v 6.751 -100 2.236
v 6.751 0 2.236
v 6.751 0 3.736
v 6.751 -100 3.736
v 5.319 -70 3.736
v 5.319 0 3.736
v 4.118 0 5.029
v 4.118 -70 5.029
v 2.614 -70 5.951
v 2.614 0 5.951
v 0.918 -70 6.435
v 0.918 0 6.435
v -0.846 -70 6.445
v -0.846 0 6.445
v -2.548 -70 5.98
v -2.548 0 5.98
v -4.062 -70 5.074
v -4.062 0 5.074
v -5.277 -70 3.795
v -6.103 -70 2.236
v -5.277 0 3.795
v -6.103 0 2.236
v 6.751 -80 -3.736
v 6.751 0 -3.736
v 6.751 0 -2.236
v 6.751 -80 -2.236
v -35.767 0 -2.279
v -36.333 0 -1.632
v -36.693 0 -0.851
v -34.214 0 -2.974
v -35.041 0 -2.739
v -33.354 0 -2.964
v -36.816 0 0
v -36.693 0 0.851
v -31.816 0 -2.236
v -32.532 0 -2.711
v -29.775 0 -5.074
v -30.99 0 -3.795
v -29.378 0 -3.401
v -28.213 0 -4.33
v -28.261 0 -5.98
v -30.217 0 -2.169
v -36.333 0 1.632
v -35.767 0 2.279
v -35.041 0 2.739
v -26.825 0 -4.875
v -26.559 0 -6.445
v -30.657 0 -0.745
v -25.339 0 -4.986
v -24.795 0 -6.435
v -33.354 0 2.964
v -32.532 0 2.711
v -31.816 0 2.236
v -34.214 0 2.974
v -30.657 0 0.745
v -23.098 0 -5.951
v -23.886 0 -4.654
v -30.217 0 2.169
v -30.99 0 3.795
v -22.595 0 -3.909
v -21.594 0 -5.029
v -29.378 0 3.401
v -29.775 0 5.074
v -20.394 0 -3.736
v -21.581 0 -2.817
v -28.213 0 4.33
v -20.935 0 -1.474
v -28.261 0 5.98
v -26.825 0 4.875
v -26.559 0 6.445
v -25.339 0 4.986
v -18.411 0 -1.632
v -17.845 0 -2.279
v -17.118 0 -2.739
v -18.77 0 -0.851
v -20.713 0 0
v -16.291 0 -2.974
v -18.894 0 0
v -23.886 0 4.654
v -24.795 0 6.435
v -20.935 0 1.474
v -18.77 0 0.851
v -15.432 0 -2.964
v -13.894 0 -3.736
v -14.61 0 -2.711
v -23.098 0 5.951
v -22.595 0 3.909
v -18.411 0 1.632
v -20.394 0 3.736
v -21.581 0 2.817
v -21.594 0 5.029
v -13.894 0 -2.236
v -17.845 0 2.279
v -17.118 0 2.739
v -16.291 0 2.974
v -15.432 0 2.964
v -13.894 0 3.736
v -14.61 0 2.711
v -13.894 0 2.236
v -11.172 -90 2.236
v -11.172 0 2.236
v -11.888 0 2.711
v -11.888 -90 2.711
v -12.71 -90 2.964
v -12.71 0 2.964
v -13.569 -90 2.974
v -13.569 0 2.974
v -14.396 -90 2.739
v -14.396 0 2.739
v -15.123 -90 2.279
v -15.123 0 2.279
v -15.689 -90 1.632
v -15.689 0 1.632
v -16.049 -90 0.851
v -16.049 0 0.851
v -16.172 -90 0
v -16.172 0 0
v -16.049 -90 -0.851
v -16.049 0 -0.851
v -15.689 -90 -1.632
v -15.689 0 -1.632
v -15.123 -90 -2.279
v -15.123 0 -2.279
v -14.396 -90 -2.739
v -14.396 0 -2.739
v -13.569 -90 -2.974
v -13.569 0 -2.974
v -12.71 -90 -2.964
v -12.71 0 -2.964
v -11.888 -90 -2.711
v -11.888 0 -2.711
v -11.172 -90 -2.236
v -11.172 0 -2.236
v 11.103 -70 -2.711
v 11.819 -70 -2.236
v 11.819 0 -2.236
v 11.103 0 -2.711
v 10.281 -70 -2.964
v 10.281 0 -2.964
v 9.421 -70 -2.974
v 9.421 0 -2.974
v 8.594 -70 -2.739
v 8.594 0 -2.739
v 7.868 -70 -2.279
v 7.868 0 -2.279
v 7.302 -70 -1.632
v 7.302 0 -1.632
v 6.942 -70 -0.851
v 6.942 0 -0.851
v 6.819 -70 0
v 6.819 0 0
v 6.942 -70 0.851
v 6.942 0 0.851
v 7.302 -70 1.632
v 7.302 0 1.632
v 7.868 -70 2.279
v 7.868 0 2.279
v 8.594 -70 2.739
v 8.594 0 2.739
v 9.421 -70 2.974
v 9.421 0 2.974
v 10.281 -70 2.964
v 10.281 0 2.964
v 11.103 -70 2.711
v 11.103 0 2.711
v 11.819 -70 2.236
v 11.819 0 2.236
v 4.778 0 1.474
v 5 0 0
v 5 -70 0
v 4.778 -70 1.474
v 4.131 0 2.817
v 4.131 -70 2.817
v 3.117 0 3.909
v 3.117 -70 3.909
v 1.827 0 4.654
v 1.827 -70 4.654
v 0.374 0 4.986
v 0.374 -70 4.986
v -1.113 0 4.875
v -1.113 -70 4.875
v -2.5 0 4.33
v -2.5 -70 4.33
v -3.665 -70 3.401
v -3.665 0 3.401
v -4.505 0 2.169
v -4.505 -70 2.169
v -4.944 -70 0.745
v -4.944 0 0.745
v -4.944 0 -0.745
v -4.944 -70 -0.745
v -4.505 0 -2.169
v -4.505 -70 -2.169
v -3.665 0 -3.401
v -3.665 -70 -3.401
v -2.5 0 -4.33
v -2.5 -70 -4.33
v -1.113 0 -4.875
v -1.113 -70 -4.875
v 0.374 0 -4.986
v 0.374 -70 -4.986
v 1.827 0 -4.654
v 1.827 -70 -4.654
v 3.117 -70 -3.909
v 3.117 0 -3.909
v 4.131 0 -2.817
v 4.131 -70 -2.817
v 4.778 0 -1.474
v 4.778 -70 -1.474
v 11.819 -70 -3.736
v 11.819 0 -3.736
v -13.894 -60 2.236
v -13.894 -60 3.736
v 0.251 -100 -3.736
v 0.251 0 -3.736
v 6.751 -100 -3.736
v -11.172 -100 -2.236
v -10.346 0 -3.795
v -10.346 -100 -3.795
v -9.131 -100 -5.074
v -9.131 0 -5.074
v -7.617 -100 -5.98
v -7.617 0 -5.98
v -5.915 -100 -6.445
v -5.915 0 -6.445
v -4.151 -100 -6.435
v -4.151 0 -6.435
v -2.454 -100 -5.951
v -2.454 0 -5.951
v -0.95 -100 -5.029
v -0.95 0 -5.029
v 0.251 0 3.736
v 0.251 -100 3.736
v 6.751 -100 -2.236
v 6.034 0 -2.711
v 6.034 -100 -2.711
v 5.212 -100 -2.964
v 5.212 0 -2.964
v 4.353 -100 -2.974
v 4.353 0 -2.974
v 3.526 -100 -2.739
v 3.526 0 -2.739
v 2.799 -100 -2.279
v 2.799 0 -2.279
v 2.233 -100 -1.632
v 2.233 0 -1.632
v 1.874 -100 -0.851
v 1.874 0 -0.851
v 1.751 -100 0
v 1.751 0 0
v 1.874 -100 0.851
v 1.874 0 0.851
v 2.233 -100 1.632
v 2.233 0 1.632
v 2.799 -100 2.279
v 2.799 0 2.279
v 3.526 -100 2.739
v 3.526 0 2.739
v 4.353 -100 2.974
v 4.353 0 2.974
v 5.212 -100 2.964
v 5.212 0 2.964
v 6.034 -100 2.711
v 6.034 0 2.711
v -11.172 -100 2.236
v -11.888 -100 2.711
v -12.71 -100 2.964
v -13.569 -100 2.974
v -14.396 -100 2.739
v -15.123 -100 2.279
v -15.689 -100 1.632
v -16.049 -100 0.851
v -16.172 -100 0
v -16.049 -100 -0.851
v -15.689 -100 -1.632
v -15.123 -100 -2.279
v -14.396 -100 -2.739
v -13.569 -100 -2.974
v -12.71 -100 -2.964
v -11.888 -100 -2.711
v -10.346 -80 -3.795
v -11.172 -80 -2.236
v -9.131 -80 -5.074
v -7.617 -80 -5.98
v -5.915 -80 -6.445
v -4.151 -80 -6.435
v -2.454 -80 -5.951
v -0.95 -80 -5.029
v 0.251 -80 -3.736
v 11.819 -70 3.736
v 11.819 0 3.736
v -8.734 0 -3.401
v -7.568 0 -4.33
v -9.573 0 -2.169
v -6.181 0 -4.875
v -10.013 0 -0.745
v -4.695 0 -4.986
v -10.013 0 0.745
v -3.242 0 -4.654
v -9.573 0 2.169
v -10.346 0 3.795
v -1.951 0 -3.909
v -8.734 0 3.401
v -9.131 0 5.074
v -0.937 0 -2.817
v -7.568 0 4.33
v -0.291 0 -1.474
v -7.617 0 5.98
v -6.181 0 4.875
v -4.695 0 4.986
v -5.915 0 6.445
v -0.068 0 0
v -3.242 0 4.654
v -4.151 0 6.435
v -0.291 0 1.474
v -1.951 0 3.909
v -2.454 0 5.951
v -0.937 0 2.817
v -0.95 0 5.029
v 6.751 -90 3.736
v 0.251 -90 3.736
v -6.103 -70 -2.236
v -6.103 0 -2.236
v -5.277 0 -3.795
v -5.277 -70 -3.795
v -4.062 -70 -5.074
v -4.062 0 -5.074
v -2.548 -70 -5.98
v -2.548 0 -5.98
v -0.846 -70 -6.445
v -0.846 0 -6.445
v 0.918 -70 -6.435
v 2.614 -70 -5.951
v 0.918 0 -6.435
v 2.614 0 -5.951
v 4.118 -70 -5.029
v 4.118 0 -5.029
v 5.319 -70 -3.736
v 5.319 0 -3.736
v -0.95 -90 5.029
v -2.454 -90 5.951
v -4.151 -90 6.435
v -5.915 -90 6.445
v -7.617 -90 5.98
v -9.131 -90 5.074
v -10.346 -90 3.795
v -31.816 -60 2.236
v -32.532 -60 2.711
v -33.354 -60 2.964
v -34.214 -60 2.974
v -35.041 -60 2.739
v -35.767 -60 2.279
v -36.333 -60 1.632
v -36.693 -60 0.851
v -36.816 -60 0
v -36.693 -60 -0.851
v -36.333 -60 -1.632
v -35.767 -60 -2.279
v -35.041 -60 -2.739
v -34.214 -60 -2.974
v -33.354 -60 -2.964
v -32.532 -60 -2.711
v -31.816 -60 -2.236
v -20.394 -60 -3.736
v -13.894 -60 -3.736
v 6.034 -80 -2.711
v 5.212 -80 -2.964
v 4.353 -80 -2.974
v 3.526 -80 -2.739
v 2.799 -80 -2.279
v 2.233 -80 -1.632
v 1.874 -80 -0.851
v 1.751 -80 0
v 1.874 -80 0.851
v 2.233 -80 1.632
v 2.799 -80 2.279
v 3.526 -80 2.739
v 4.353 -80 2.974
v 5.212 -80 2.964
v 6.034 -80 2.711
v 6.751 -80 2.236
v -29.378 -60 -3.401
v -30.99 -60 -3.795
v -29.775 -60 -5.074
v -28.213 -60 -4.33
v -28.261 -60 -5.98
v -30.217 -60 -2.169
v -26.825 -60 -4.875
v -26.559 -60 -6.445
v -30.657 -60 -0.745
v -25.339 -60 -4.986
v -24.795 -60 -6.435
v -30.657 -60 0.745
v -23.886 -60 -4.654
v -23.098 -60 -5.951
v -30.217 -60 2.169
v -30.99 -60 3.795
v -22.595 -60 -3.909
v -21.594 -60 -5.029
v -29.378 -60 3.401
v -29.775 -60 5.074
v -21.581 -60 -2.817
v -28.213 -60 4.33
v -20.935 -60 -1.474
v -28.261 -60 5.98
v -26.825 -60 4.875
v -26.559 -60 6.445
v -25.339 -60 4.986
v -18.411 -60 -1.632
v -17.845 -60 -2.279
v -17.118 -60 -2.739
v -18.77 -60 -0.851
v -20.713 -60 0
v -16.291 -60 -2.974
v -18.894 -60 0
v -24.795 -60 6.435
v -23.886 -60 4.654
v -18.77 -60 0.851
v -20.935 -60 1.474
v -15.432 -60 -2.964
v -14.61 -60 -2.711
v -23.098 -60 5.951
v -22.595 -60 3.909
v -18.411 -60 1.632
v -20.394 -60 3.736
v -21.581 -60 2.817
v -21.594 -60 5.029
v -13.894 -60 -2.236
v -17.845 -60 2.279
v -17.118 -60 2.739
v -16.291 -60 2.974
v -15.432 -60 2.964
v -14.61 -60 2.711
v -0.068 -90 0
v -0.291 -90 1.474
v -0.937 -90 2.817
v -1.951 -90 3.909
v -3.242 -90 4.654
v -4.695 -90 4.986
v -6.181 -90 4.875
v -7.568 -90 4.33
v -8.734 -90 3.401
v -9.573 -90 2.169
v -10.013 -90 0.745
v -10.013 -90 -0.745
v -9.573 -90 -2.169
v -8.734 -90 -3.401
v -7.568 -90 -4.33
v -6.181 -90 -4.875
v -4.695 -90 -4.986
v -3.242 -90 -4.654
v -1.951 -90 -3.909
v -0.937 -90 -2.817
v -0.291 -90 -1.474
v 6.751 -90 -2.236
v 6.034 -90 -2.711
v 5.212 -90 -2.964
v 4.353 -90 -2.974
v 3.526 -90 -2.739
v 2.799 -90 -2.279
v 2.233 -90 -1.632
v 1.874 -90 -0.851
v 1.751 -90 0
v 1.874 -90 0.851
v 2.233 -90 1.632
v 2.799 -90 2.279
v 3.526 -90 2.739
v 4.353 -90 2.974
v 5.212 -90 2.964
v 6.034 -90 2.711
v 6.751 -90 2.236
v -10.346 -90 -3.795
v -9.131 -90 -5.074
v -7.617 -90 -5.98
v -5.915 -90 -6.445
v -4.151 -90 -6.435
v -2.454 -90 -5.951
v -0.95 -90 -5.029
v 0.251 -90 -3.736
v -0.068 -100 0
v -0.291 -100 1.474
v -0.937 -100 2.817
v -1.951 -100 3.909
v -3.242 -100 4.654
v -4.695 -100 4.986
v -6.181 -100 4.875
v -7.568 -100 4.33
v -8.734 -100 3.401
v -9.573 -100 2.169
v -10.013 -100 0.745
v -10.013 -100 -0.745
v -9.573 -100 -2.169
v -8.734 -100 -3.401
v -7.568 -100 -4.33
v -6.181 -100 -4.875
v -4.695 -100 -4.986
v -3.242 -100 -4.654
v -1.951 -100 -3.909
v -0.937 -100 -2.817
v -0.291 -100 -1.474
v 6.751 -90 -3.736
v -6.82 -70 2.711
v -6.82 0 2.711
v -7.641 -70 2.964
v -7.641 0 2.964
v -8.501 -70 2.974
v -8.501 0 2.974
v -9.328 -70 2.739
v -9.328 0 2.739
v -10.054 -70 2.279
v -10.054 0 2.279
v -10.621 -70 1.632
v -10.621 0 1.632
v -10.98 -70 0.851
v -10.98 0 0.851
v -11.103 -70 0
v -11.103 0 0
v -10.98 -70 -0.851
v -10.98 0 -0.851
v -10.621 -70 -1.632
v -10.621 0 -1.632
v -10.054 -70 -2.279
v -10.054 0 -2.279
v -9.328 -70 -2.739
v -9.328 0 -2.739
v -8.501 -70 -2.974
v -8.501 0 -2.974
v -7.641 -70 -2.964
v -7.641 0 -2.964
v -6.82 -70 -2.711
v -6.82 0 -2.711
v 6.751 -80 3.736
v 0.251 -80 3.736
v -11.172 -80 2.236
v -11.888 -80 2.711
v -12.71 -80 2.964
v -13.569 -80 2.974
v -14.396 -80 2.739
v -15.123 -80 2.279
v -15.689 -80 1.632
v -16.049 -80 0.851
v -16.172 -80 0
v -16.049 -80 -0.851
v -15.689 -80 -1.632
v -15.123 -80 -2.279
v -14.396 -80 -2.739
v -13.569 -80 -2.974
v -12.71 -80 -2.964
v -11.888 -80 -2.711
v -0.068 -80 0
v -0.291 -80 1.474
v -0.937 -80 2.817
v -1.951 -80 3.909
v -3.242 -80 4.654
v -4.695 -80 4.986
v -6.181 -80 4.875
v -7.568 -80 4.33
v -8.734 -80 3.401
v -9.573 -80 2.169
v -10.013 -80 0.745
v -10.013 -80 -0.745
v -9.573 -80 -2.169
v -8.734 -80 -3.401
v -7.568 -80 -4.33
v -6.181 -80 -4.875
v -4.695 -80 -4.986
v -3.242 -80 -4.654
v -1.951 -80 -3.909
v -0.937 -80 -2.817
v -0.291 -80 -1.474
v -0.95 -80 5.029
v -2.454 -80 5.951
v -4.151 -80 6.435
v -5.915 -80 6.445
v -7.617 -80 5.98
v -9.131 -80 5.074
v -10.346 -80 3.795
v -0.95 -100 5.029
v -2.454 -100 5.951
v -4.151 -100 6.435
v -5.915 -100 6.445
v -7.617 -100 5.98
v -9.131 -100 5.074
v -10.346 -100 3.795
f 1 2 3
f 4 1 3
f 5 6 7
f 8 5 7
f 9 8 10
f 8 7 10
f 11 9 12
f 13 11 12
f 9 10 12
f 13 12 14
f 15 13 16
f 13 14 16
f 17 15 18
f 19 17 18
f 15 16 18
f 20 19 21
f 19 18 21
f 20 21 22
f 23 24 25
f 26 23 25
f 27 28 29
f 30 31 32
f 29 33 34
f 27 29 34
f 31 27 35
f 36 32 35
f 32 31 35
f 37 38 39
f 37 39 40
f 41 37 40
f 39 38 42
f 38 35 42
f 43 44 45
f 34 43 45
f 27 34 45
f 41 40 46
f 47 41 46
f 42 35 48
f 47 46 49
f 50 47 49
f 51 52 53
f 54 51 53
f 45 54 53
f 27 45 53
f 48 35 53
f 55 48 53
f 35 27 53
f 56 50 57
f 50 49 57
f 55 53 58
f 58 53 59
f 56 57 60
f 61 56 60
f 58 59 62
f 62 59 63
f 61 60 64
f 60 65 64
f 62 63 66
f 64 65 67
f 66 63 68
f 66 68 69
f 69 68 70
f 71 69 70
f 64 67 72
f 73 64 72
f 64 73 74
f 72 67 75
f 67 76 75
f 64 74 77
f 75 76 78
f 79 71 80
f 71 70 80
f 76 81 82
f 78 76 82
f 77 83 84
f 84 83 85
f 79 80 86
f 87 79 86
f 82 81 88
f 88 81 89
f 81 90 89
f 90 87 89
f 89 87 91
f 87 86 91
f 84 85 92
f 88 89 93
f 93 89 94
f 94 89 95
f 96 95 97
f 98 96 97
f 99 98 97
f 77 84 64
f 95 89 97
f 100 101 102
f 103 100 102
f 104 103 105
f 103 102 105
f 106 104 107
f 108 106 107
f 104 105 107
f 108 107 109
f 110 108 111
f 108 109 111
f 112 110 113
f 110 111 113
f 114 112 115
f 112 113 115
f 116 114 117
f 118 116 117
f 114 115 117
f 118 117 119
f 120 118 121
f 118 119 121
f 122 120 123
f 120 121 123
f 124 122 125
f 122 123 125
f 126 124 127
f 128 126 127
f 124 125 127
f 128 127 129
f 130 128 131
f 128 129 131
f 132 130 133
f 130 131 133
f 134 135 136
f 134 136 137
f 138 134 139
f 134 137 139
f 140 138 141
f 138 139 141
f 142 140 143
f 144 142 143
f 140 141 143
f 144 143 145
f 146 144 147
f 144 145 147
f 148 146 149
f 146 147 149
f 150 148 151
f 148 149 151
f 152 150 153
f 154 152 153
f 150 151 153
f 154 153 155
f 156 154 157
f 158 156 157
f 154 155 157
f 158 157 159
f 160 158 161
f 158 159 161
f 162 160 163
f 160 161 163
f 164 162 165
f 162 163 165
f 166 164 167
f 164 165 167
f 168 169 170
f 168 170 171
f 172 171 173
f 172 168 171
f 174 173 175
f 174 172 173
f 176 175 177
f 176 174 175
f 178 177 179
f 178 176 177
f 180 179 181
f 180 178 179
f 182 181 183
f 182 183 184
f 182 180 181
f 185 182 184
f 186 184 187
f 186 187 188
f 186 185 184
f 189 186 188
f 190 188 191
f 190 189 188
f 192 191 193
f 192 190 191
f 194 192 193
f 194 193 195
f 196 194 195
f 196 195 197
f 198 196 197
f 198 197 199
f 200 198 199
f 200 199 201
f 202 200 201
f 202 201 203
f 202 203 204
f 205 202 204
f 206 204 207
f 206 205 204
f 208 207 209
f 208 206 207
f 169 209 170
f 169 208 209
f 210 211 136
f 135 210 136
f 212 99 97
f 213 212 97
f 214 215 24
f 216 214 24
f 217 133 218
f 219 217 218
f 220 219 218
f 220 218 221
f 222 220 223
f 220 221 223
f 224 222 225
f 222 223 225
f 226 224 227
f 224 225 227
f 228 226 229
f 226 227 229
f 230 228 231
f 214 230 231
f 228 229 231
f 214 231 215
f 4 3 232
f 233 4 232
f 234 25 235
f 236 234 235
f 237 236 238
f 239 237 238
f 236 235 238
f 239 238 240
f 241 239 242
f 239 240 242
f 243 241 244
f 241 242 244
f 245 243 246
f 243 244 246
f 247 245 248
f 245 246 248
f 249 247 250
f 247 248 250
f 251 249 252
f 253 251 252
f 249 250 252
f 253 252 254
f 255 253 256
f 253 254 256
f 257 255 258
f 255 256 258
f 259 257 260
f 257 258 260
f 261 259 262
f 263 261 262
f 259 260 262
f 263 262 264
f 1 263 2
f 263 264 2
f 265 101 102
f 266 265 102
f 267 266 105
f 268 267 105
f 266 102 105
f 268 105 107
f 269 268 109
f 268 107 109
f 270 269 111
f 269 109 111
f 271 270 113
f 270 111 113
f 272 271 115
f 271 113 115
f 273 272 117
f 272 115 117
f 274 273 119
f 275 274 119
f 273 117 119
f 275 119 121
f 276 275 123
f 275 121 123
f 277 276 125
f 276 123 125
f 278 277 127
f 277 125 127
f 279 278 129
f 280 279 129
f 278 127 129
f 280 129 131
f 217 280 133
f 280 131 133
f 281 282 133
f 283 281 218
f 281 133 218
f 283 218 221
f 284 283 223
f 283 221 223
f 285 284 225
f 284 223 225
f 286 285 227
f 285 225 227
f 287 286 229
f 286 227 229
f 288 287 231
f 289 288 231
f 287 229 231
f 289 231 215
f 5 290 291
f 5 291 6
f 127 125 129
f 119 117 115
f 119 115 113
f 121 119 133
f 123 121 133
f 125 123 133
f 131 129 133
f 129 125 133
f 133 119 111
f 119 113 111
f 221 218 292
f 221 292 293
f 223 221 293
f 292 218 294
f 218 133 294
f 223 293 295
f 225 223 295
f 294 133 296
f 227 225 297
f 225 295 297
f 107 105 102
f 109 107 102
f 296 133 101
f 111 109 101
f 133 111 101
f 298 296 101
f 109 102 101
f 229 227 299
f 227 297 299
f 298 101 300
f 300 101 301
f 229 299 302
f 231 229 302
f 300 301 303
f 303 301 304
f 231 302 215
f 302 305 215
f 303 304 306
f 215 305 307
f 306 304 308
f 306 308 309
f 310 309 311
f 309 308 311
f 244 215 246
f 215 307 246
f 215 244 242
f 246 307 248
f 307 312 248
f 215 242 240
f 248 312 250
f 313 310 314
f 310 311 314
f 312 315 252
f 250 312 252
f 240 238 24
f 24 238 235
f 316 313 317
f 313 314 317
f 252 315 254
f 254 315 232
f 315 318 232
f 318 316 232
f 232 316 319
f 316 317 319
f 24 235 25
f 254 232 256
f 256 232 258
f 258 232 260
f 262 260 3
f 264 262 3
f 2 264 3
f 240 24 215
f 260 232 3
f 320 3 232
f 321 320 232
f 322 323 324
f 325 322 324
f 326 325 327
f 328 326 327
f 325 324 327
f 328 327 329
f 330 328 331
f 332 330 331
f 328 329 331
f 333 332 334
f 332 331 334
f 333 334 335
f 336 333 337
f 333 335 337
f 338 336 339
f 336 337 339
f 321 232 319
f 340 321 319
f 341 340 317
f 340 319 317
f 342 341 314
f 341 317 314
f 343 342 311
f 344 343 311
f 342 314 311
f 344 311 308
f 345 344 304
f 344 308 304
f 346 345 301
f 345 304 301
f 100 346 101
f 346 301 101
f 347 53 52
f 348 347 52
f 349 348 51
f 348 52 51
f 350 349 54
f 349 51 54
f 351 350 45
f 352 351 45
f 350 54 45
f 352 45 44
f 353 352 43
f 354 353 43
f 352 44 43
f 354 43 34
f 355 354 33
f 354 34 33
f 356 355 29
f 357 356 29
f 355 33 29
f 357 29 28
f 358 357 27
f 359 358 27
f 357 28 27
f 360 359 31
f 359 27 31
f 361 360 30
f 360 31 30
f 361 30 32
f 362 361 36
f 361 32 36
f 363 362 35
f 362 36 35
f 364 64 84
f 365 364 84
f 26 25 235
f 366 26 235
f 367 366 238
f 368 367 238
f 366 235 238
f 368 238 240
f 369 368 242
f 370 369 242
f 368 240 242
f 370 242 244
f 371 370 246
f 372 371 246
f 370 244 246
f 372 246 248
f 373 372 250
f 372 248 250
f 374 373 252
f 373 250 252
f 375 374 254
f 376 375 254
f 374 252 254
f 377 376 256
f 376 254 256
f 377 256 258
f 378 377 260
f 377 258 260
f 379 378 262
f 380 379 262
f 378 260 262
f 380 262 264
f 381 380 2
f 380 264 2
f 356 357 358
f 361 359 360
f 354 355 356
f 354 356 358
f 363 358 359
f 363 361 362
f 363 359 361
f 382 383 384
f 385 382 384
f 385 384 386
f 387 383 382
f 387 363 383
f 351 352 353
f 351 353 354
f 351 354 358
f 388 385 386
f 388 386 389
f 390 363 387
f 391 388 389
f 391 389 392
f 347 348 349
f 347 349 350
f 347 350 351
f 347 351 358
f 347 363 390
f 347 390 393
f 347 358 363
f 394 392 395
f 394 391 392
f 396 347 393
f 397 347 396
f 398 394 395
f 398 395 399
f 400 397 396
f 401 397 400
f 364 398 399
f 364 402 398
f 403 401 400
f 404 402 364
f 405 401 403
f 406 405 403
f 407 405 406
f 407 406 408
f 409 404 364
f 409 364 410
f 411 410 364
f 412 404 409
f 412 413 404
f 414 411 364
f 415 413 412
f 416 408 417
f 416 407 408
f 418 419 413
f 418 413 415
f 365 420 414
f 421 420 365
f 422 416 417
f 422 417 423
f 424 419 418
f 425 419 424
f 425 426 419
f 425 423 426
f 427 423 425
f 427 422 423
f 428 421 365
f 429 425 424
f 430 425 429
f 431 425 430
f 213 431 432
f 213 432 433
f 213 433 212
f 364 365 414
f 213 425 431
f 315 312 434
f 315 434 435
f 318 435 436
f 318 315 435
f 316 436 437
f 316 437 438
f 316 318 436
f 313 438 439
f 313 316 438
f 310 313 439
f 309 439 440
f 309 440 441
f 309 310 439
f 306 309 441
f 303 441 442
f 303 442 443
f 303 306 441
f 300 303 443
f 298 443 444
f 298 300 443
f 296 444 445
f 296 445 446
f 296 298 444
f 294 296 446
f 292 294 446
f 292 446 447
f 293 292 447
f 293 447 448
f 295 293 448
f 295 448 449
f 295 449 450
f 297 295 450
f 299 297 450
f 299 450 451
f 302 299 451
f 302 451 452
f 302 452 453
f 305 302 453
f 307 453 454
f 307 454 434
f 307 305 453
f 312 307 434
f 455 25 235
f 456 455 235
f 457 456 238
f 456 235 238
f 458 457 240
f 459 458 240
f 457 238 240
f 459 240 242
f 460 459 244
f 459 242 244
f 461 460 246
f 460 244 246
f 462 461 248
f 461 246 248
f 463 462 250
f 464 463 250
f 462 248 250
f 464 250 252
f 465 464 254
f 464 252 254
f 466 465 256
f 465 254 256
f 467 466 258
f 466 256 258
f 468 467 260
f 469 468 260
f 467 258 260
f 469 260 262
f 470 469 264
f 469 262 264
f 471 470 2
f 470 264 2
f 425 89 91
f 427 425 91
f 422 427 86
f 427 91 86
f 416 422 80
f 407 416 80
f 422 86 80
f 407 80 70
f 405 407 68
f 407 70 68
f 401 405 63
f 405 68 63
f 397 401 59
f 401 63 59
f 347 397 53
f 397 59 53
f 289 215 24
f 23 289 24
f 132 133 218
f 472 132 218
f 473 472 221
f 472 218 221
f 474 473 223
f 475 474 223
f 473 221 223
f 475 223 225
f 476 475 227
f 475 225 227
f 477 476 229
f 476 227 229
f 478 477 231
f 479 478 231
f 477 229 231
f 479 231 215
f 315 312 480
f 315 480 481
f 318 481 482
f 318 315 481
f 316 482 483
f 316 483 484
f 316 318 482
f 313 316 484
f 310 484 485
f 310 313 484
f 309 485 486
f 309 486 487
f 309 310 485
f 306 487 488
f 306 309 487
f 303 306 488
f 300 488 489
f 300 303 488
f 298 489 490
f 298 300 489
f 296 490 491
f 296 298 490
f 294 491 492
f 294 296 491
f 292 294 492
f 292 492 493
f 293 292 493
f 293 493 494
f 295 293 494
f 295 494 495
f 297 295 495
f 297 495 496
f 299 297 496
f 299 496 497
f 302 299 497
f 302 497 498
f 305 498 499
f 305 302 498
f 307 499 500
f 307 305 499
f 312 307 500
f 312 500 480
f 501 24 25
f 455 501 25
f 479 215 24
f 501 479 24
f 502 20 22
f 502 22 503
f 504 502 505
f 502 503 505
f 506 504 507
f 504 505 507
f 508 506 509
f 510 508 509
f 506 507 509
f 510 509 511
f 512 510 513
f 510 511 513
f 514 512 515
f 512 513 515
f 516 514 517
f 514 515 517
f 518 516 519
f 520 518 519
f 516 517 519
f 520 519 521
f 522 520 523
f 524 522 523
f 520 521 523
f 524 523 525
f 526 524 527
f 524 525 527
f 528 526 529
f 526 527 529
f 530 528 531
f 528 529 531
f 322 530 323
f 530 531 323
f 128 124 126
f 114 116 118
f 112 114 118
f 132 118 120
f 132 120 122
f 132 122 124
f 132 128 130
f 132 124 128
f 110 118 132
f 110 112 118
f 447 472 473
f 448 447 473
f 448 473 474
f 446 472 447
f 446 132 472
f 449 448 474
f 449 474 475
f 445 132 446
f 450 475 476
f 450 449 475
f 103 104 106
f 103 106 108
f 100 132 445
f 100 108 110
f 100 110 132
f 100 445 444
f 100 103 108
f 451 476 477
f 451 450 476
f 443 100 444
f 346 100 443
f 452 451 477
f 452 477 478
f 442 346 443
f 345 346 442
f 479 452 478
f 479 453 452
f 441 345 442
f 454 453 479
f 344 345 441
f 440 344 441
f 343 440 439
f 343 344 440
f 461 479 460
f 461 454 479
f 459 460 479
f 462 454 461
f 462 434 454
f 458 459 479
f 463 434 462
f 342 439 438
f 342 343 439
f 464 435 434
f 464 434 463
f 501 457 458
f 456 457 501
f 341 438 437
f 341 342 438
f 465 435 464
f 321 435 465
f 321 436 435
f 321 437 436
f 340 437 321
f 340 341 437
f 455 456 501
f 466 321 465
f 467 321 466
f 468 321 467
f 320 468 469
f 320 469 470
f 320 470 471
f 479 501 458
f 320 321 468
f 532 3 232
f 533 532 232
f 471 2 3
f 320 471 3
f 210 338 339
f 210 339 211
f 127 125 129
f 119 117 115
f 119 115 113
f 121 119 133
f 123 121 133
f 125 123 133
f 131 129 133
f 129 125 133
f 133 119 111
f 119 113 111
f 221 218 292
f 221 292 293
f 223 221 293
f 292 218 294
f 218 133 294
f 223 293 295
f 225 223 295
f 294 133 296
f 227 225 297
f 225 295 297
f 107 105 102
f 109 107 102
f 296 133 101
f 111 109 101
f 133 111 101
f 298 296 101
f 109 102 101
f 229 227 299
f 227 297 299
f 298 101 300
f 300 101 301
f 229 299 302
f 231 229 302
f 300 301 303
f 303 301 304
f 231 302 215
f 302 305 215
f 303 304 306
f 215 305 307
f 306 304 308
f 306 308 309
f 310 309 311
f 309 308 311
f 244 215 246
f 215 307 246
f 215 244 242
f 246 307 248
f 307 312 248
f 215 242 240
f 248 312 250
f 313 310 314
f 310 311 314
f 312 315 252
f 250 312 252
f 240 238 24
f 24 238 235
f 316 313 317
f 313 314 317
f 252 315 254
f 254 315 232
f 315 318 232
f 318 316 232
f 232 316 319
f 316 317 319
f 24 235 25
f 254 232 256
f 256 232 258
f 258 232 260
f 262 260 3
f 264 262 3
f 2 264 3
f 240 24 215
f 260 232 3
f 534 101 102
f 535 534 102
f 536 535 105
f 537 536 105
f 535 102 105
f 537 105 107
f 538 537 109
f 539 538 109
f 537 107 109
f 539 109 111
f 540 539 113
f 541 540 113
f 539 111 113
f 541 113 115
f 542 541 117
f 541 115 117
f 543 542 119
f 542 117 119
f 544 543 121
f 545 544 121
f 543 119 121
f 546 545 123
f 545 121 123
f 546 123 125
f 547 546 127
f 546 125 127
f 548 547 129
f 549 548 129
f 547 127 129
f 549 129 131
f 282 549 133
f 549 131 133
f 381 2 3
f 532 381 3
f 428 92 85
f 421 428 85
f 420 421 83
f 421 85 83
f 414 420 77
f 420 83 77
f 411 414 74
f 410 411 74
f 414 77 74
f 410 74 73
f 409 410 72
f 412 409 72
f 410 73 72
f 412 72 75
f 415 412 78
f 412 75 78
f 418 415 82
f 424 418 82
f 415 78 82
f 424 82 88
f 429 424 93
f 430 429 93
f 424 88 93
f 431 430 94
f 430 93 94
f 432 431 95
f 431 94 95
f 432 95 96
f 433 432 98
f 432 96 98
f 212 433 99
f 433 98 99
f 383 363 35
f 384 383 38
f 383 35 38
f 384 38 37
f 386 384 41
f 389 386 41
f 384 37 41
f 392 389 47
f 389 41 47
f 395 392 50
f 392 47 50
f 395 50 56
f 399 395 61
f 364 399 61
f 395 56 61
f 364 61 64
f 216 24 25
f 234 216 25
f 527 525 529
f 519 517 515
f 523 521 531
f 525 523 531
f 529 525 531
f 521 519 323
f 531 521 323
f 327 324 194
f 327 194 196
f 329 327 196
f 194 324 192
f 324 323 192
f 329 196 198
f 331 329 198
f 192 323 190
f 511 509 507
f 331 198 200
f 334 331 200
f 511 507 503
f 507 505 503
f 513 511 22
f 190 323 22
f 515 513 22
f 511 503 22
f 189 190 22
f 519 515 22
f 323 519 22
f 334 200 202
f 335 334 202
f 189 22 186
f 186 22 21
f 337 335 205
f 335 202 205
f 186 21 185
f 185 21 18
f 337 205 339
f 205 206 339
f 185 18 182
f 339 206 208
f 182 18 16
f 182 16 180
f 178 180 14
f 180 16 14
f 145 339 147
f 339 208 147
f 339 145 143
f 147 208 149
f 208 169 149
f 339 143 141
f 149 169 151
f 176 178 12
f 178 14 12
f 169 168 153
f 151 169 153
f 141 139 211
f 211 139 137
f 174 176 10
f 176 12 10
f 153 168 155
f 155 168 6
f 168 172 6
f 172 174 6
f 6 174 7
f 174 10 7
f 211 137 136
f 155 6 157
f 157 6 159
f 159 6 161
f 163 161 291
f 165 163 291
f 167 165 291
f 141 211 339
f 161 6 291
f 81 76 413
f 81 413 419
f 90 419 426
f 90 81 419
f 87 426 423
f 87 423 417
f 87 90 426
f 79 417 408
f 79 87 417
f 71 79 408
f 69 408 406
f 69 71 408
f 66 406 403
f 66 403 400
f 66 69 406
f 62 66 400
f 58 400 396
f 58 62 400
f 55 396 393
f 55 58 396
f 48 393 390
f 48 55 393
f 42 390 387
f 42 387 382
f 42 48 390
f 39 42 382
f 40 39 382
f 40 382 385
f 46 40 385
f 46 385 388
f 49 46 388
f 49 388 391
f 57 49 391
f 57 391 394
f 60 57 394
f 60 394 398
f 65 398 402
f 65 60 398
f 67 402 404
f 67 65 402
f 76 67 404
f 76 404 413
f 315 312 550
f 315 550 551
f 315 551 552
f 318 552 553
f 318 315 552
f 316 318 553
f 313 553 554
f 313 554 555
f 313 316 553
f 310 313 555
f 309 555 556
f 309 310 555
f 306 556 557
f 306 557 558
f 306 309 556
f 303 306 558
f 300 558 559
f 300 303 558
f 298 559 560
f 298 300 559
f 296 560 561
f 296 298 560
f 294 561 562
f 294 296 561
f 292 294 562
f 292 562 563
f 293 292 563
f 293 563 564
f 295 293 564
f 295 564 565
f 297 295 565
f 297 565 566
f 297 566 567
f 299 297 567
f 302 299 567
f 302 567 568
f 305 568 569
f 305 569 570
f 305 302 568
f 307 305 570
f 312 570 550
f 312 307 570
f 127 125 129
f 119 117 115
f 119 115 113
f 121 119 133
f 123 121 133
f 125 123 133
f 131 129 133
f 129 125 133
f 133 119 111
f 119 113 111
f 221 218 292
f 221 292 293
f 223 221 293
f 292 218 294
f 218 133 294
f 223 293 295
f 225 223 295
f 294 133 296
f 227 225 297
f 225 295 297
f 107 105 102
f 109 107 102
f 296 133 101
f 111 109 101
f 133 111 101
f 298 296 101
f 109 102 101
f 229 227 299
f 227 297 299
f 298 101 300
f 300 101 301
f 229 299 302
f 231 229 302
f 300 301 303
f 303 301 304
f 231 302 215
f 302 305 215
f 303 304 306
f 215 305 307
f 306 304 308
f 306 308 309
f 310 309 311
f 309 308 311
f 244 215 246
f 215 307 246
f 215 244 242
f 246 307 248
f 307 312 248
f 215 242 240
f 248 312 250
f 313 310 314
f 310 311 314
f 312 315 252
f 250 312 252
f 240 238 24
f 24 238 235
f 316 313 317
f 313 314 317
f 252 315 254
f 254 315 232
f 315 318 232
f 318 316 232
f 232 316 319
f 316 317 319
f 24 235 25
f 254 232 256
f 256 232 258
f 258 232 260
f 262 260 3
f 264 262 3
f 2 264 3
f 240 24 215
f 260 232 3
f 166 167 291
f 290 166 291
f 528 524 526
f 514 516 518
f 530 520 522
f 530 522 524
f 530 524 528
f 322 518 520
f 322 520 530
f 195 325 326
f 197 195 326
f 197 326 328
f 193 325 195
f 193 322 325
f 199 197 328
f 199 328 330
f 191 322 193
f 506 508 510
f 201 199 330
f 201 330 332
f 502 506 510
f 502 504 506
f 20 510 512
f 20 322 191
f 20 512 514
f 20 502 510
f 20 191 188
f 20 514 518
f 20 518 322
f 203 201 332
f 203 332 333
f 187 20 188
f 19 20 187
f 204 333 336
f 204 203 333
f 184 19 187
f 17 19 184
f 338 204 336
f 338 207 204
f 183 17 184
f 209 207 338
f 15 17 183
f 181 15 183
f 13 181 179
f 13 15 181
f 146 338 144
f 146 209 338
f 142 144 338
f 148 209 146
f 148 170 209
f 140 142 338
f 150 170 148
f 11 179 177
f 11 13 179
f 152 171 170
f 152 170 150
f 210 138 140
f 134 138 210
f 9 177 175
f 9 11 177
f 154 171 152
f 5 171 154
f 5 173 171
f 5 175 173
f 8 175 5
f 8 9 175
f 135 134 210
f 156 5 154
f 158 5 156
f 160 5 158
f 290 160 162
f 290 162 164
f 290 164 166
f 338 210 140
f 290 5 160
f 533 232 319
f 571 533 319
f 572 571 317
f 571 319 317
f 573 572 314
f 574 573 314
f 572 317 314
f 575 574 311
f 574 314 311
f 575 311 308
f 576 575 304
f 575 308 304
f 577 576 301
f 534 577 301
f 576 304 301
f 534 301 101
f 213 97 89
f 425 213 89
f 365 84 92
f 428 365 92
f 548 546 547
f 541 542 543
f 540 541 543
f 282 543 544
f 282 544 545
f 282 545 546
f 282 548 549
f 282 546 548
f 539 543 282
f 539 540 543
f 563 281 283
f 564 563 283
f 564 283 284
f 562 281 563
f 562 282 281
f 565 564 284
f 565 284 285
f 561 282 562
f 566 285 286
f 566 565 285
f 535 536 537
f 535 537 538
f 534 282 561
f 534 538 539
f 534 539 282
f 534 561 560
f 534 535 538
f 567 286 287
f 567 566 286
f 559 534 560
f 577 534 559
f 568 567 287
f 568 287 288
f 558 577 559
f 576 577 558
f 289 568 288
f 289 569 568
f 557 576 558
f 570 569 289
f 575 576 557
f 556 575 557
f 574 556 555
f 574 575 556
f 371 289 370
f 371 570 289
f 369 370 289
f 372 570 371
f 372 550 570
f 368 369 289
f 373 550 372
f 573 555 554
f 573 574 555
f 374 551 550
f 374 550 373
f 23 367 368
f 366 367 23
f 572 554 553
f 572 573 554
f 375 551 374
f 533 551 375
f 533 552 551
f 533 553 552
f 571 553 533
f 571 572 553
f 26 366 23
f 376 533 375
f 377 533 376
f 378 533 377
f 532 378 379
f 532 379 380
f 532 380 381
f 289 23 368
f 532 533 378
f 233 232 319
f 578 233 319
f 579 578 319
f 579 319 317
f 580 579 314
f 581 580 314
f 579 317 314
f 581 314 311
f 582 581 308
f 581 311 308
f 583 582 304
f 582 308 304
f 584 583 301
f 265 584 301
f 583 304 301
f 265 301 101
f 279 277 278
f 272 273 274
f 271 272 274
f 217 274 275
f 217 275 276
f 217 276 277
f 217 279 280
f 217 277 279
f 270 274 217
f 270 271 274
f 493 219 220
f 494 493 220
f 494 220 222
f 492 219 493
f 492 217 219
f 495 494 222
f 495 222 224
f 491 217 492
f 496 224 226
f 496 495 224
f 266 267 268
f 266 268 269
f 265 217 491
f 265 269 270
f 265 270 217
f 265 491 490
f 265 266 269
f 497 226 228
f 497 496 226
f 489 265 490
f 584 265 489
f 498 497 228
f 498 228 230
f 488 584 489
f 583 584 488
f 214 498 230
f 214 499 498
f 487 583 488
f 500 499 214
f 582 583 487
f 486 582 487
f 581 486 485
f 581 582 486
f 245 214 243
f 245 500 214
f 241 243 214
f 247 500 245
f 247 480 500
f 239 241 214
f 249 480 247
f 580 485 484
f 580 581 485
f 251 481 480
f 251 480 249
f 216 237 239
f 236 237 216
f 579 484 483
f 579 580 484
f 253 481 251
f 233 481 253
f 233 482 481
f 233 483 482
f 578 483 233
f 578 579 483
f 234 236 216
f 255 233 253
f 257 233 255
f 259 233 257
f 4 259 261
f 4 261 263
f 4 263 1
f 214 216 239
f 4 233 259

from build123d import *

# Parameters (mm, degrees)
F0_R     = 5
F1_DEPTH = 70
F2_R     = 5
F3_DEPTH = 60
F4_R     = 5
F5_DEPTH = 80
F6_R     = 5
F7_DEPTH = 90
F8_R     = 5
F9_DEPTH = 100


with BuildPart() as f1:
    # F0 (on Front) → F1 (new body)
    with BuildSketch(Plane.XZ):
        with BuildLine():
            ThreePointArc((5.3190032964, -3.7360679775), (6.1977222198, -1.9591424876), (6.5, 0))
            ThreePointArc((6.5, 0), (6.1977222198, 1.9591424876), (5.3190032964, 3.7360679775))
            ThreePointArc((5.3190032964, 3.7360679775), (-0.8463283212, 6.4446666611), (-6.1032778079, 2.2360679775))
            ThreePointArc((-6.1032778079, 2.2360679775), (-6.5, 0), (-6.1032778079, -2.2360679775))
            ThreePointArc((-6.1032778079, -2.2360679775), (-0.8463283212, -6.4446666611), (5.3190032964, -3.7360679775))
        make_face()
        Circle(F0_R, mode=Mode.SUBTRACT)
        with BuildLine():
            ThreePointArc((-6.1032778079, -2.2360679775), (-6.5, 0), (-6.1032778079, 2.2360679775))
            ThreePointArc((-6.1032778079, 2.2360679775), (-11.1032778079, 0), (-6.1032778079, -2.2360679775))
        make_face()
        with BuildLine():
            ThreePointArc((5.3190032964, 3.7360679775), (6.1977222198, 1.9591424876), (6.5, 0))
            ThreePointArc((6.5, 0), (6.1977222198, -1.9591424876), (5.3190032964, -3.7360679775))
            Line((5.3190032964, -3.7360679775), (11.8190032964, -3.7360679775))
            Line((11.8190032964, -3.7360679775), (11.8190032964, -2.2360679775))
            ThreePointArc((11.8190032964, -2.2360679775), (6.8190032964, 0), (11.8190032964, 2.2360679775))
            Line((11.8190032964, 2.2360679775), (11.8190032964, 3.7360679775))
            Line((11.8190032964, 3.7360679775), (5.3190032964, 3.7360679775))
        make_face()
    extrude(amount=F1_DEPTH)


with BuildPart() as f3:
    # F2 (on Front) → F3 (new body)
    with BuildSketch(Plane.XZ):
        with BuildLine():
            ThreePointArc((-31.8158183519, -2.2360679775), (-32.212540544, 0), (-31.8158183519, 2.2360679775))
            ThreePointArc((-31.8158183519, 2.2360679775), (-36.8158183519, 0), (-31.8158183519, -2.2360679775))
        make_face()
        with BuildLine():
            ThreePointArc((-20.3935372476, -3.7360679775), (-19.5148183243, -1.9591424876), (-19.212540544, 0))
            ThreePointArc((-19.212540544, 0), (-19.5148183243, 1.9591424876), (-20.3935372476, 3.7360679775))
            ThreePointArc((-20.3935372476, 3.7360679775), (-26.5588688653, 6.4446666611), (-31.8158183519, 2.2360679775))
            ThreePointArc((-31.8158183519, 2.2360679775), (-32.212540544, 0), (-31.8158183519, -2.2360679775))
            ThreePointArc((-31.8158183519, -2.2360679775), (-26.5588688653, -6.4446666611), (-20.3935372476, -3.7360679775))
        make_face()
        with Locations((-25.712540544, 0)):
            Circle(F2_R, mode=Mode.SUBTRACT)
        with BuildLine():
            ThreePointArc((-20.3935372476, 3.7360679775), (-19.5148183243, 1.9591424876), (-19.212540544, 0))
            ThreePointArc((-19.212540544, 0), (-19.5148183243, -1.9591424876), (-20.3935372476, -3.7360679775))
            Line((-20.3935372476, -3.7360679775), (-13.8935372476, -3.7360679775))
            Line((-13.8935372476, -3.7360679775), (-13.8935372476, -2.2360679775))
            ThreePointArc((-13.8935372476, -2.2360679775), (-18.8935372476, 0), (-13.8935372476, 2.2360679775))
            Line((-13.8935372476, 2.2360679775), (-13.8935372476, 3.7360679775))
            Line((-13.8935372476, 3.7360679775), (-20.3935372476, 3.7360679775))
        make_face()
    extrude(amount=F3_DEPTH)


with BuildPart() as f5:
    # F4 (on Front) → F5 (new body)
    with BuildSketch(Plane.XZ):
        with BuildLine():
            ThreePointArc((-11.171749634, -2.2360679775), (-11.5684718261, 0), (-11.171749634, 2.2360679775))
            ThreePointArc((-11.171749634, 2.2360679775), (-16.171749634, 0), (-11.171749634, -2.2360679775))
        make_face()
        with BuildLine():
            ThreePointArc((0.2505314703, -3.7360679775), (1.1292503937, -1.9591424876), (1.4315281739, 0))
            ThreePointArc((1.4315281739, 0), (1.1292503937, 1.9591424876), (0.2505314703, 3.7360679775))
            ThreePointArc((0.2505314703, 3.7360679775), (-5.9148001473, 6.4446666611), (-11.171749634, 2.2360679775))
            ThreePointArc((-11.171749634, 2.2360679775), (-11.5684718261, 0), (-11.171749634, -2.2360679775))
            ThreePointArc((-11.171749634, -2.2360679775), (-5.9148001473, -6.4446666611), (0.2505314703, -3.7360679775))
        make_face()
        with Locations((-5.0684718261, 0)):
            Circle(F4_R, mode=Mode.SUBTRACT)
        with BuildLine():
            ThreePointArc((0.2505314703, 3.7360679775), (1.1292503937, 1.9591424876), (1.4315281739, 0))
            ThreePointArc((1.4315281739, 0), (1.1292503937, -1.9591424876), (0.2505314703, -3.7360679775))
            Line((0.2505314703, -3.7360679775), (6.7505314703, -3.7360679775))
            Line((6.7505314703, -3.7360679775), (6.7505314703, -2.2360679775))
            ThreePointArc((6.7505314703, -2.2360679775), (1.7505314703, 0), (6.7505314703, 2.2360679775))
            Line((6.7505314703, 2.2360679775), (6.7505314703, 3.7360679775))
            Line((6.7505314703, 3.7360679775), (0.2505314703, 3.7360679775))
        make_face()
    extrude(amount=F5_DEPTH)


with BuildPart() as f7:
    # F6 (on Front) → F7 (new body)
    with BuildSketch(Plane.XZ):
        with BuildLine():
            ThreePointArc((-11.171749634, -2.2360679775), (-11.5684718261, 0), (-11.171749634, 2.2360679775))
            ThreePointArc((-11.171749634, 2.2360679775), (-16.171749634, 0), (-11.171749634, -2.2360679775))
        make_face()
        with BuildLine():
            ThreePointArc((0.2505314703, -3.7360679775), (1.1292503937, -1.9591424876), (1.4315281739, 0))
            ThreePointArc((1.4315281739, 0), (1.1292503937, 1.9591424876), (0.2505314703, 3.7360679775))
            ThreePointArc((0.2505314703, 3.7360679775), (-5.9148001473, 6.4446666611), (-11.171749634, 2.2360679775))
            ThreePointArc((-11.171749634, 2.2360679775), (-11.5684718261, 0), (-11.171749634, -2.2360679775))
            ThreePointArc((-11.171749634, -2.2360679775), (-5.9148001473, -6.4446666611), (0.2505314703, -3.7360679775))
        make_face()
        with Locations((-5.0684718261, 0)):
            Circle(F6_R, mode=Mode.SUBTRACT)
        with BuildLine():
            ThreePointArc((0.2505314703, 3.7360679775), (1.1292503937, 1.9591424876), (1.4315281739, 0))
            ThreePointArc((1.4315281739, 0), (1.1292503937, -1.9591424876), (0.2505314703, -3.7360679775))
            Line((0.2505314703, -3.7360679775), (6.7505314703, -3.7360679775))
            Line((6.7505314703, -3.7360679775), (6.7505314703, -2.2360679775))
            ThreePointArc((6.7505314703, -2.2360679775), (1.7505314703, 0), (6.7505314703, 2.2360679775))
            Line((6.7505314703, 2.2360679775), (6.7505314703, 3.7360679775))
            Line((6.7505314703, 3.7360679775), (0.2505314703, 3.7360679775))
        make_face()
    extrude(amount=F7_DEPTH)


with BuildPart() as f9:
    # F8 (on Front) → F9 (new body)
    with BuildSketch(Plane.XZ):
        with BuildLine():
            ThreePointArc((-11.171749634, -2.2360679775), (-11.5684718261, 0), (-11.171749634, 2.2360679775))
            ThreePointArc((-11.171749634, 2.2360679775), (-16.171749634, 0), (-11.171749634, -2.2360679775))
        make_face()
        with BuildLine():
            ThreePointArc((0.2505314703, -3.7360679775), (1.1292503937, -1.9591424876), (1.4315281739, 0))
            ThreePointArc((1.4315281739, 0), (1.1292503937, 1.9591424876), (0.2505314703, 3.7360679775))
            ThreePointArc((0.2505314703, 3.7360679775), (-5.9148001473, 6.4446666611), (-11.171749634, 2.2360679775))
            ThreePointArc((-11.171749634, 2.2360679775), (-11.5684718261, 0), (-11.171749634, -2.2360679775))
            ThreePointArc((-11.171749634, -2.2360679775), (-5.9148001473, -6.4446666611), (0.2505314703, -3.7360679775))
        make_face()
        with Locations((-5.0684718261, 0)):
            Circle(F8_R, mode=Mode.SUBTRACT)
        with BuildLine():
            ThreePointArc((0.2505314703, 3.7360679775), (1.1292503937, 1.9591424876), (1.4315281739, 0))
            ThreePointArc((1.4315281739, 0), (1.1292503937, -1.9591424876), (0.2505314703, -3.7360679775))
            Line((0.2505314703, -3.7360679775), (6.7505314703, -3.7360679775))
            Line((6.7505314703, -3.7360679775), (6.7505314703, -2.2360679775))
            ThreePointArc((6.7505314703, -2.2360679775), (1.7505314703, 0), (6.7505314703, 2.2360679775))
            Line((6.7505314703, 2.2360679775), (6.7505314703, 3.7360679775))
            Line((6.7505314703, 3.7360679775), (0.2505314703, 3.7360679775))
        make_face()
    extrude(amount=F9_DEPTH)


solid = Compound([f1.part, f3.part, f5.part, f7.part, f9.part])
